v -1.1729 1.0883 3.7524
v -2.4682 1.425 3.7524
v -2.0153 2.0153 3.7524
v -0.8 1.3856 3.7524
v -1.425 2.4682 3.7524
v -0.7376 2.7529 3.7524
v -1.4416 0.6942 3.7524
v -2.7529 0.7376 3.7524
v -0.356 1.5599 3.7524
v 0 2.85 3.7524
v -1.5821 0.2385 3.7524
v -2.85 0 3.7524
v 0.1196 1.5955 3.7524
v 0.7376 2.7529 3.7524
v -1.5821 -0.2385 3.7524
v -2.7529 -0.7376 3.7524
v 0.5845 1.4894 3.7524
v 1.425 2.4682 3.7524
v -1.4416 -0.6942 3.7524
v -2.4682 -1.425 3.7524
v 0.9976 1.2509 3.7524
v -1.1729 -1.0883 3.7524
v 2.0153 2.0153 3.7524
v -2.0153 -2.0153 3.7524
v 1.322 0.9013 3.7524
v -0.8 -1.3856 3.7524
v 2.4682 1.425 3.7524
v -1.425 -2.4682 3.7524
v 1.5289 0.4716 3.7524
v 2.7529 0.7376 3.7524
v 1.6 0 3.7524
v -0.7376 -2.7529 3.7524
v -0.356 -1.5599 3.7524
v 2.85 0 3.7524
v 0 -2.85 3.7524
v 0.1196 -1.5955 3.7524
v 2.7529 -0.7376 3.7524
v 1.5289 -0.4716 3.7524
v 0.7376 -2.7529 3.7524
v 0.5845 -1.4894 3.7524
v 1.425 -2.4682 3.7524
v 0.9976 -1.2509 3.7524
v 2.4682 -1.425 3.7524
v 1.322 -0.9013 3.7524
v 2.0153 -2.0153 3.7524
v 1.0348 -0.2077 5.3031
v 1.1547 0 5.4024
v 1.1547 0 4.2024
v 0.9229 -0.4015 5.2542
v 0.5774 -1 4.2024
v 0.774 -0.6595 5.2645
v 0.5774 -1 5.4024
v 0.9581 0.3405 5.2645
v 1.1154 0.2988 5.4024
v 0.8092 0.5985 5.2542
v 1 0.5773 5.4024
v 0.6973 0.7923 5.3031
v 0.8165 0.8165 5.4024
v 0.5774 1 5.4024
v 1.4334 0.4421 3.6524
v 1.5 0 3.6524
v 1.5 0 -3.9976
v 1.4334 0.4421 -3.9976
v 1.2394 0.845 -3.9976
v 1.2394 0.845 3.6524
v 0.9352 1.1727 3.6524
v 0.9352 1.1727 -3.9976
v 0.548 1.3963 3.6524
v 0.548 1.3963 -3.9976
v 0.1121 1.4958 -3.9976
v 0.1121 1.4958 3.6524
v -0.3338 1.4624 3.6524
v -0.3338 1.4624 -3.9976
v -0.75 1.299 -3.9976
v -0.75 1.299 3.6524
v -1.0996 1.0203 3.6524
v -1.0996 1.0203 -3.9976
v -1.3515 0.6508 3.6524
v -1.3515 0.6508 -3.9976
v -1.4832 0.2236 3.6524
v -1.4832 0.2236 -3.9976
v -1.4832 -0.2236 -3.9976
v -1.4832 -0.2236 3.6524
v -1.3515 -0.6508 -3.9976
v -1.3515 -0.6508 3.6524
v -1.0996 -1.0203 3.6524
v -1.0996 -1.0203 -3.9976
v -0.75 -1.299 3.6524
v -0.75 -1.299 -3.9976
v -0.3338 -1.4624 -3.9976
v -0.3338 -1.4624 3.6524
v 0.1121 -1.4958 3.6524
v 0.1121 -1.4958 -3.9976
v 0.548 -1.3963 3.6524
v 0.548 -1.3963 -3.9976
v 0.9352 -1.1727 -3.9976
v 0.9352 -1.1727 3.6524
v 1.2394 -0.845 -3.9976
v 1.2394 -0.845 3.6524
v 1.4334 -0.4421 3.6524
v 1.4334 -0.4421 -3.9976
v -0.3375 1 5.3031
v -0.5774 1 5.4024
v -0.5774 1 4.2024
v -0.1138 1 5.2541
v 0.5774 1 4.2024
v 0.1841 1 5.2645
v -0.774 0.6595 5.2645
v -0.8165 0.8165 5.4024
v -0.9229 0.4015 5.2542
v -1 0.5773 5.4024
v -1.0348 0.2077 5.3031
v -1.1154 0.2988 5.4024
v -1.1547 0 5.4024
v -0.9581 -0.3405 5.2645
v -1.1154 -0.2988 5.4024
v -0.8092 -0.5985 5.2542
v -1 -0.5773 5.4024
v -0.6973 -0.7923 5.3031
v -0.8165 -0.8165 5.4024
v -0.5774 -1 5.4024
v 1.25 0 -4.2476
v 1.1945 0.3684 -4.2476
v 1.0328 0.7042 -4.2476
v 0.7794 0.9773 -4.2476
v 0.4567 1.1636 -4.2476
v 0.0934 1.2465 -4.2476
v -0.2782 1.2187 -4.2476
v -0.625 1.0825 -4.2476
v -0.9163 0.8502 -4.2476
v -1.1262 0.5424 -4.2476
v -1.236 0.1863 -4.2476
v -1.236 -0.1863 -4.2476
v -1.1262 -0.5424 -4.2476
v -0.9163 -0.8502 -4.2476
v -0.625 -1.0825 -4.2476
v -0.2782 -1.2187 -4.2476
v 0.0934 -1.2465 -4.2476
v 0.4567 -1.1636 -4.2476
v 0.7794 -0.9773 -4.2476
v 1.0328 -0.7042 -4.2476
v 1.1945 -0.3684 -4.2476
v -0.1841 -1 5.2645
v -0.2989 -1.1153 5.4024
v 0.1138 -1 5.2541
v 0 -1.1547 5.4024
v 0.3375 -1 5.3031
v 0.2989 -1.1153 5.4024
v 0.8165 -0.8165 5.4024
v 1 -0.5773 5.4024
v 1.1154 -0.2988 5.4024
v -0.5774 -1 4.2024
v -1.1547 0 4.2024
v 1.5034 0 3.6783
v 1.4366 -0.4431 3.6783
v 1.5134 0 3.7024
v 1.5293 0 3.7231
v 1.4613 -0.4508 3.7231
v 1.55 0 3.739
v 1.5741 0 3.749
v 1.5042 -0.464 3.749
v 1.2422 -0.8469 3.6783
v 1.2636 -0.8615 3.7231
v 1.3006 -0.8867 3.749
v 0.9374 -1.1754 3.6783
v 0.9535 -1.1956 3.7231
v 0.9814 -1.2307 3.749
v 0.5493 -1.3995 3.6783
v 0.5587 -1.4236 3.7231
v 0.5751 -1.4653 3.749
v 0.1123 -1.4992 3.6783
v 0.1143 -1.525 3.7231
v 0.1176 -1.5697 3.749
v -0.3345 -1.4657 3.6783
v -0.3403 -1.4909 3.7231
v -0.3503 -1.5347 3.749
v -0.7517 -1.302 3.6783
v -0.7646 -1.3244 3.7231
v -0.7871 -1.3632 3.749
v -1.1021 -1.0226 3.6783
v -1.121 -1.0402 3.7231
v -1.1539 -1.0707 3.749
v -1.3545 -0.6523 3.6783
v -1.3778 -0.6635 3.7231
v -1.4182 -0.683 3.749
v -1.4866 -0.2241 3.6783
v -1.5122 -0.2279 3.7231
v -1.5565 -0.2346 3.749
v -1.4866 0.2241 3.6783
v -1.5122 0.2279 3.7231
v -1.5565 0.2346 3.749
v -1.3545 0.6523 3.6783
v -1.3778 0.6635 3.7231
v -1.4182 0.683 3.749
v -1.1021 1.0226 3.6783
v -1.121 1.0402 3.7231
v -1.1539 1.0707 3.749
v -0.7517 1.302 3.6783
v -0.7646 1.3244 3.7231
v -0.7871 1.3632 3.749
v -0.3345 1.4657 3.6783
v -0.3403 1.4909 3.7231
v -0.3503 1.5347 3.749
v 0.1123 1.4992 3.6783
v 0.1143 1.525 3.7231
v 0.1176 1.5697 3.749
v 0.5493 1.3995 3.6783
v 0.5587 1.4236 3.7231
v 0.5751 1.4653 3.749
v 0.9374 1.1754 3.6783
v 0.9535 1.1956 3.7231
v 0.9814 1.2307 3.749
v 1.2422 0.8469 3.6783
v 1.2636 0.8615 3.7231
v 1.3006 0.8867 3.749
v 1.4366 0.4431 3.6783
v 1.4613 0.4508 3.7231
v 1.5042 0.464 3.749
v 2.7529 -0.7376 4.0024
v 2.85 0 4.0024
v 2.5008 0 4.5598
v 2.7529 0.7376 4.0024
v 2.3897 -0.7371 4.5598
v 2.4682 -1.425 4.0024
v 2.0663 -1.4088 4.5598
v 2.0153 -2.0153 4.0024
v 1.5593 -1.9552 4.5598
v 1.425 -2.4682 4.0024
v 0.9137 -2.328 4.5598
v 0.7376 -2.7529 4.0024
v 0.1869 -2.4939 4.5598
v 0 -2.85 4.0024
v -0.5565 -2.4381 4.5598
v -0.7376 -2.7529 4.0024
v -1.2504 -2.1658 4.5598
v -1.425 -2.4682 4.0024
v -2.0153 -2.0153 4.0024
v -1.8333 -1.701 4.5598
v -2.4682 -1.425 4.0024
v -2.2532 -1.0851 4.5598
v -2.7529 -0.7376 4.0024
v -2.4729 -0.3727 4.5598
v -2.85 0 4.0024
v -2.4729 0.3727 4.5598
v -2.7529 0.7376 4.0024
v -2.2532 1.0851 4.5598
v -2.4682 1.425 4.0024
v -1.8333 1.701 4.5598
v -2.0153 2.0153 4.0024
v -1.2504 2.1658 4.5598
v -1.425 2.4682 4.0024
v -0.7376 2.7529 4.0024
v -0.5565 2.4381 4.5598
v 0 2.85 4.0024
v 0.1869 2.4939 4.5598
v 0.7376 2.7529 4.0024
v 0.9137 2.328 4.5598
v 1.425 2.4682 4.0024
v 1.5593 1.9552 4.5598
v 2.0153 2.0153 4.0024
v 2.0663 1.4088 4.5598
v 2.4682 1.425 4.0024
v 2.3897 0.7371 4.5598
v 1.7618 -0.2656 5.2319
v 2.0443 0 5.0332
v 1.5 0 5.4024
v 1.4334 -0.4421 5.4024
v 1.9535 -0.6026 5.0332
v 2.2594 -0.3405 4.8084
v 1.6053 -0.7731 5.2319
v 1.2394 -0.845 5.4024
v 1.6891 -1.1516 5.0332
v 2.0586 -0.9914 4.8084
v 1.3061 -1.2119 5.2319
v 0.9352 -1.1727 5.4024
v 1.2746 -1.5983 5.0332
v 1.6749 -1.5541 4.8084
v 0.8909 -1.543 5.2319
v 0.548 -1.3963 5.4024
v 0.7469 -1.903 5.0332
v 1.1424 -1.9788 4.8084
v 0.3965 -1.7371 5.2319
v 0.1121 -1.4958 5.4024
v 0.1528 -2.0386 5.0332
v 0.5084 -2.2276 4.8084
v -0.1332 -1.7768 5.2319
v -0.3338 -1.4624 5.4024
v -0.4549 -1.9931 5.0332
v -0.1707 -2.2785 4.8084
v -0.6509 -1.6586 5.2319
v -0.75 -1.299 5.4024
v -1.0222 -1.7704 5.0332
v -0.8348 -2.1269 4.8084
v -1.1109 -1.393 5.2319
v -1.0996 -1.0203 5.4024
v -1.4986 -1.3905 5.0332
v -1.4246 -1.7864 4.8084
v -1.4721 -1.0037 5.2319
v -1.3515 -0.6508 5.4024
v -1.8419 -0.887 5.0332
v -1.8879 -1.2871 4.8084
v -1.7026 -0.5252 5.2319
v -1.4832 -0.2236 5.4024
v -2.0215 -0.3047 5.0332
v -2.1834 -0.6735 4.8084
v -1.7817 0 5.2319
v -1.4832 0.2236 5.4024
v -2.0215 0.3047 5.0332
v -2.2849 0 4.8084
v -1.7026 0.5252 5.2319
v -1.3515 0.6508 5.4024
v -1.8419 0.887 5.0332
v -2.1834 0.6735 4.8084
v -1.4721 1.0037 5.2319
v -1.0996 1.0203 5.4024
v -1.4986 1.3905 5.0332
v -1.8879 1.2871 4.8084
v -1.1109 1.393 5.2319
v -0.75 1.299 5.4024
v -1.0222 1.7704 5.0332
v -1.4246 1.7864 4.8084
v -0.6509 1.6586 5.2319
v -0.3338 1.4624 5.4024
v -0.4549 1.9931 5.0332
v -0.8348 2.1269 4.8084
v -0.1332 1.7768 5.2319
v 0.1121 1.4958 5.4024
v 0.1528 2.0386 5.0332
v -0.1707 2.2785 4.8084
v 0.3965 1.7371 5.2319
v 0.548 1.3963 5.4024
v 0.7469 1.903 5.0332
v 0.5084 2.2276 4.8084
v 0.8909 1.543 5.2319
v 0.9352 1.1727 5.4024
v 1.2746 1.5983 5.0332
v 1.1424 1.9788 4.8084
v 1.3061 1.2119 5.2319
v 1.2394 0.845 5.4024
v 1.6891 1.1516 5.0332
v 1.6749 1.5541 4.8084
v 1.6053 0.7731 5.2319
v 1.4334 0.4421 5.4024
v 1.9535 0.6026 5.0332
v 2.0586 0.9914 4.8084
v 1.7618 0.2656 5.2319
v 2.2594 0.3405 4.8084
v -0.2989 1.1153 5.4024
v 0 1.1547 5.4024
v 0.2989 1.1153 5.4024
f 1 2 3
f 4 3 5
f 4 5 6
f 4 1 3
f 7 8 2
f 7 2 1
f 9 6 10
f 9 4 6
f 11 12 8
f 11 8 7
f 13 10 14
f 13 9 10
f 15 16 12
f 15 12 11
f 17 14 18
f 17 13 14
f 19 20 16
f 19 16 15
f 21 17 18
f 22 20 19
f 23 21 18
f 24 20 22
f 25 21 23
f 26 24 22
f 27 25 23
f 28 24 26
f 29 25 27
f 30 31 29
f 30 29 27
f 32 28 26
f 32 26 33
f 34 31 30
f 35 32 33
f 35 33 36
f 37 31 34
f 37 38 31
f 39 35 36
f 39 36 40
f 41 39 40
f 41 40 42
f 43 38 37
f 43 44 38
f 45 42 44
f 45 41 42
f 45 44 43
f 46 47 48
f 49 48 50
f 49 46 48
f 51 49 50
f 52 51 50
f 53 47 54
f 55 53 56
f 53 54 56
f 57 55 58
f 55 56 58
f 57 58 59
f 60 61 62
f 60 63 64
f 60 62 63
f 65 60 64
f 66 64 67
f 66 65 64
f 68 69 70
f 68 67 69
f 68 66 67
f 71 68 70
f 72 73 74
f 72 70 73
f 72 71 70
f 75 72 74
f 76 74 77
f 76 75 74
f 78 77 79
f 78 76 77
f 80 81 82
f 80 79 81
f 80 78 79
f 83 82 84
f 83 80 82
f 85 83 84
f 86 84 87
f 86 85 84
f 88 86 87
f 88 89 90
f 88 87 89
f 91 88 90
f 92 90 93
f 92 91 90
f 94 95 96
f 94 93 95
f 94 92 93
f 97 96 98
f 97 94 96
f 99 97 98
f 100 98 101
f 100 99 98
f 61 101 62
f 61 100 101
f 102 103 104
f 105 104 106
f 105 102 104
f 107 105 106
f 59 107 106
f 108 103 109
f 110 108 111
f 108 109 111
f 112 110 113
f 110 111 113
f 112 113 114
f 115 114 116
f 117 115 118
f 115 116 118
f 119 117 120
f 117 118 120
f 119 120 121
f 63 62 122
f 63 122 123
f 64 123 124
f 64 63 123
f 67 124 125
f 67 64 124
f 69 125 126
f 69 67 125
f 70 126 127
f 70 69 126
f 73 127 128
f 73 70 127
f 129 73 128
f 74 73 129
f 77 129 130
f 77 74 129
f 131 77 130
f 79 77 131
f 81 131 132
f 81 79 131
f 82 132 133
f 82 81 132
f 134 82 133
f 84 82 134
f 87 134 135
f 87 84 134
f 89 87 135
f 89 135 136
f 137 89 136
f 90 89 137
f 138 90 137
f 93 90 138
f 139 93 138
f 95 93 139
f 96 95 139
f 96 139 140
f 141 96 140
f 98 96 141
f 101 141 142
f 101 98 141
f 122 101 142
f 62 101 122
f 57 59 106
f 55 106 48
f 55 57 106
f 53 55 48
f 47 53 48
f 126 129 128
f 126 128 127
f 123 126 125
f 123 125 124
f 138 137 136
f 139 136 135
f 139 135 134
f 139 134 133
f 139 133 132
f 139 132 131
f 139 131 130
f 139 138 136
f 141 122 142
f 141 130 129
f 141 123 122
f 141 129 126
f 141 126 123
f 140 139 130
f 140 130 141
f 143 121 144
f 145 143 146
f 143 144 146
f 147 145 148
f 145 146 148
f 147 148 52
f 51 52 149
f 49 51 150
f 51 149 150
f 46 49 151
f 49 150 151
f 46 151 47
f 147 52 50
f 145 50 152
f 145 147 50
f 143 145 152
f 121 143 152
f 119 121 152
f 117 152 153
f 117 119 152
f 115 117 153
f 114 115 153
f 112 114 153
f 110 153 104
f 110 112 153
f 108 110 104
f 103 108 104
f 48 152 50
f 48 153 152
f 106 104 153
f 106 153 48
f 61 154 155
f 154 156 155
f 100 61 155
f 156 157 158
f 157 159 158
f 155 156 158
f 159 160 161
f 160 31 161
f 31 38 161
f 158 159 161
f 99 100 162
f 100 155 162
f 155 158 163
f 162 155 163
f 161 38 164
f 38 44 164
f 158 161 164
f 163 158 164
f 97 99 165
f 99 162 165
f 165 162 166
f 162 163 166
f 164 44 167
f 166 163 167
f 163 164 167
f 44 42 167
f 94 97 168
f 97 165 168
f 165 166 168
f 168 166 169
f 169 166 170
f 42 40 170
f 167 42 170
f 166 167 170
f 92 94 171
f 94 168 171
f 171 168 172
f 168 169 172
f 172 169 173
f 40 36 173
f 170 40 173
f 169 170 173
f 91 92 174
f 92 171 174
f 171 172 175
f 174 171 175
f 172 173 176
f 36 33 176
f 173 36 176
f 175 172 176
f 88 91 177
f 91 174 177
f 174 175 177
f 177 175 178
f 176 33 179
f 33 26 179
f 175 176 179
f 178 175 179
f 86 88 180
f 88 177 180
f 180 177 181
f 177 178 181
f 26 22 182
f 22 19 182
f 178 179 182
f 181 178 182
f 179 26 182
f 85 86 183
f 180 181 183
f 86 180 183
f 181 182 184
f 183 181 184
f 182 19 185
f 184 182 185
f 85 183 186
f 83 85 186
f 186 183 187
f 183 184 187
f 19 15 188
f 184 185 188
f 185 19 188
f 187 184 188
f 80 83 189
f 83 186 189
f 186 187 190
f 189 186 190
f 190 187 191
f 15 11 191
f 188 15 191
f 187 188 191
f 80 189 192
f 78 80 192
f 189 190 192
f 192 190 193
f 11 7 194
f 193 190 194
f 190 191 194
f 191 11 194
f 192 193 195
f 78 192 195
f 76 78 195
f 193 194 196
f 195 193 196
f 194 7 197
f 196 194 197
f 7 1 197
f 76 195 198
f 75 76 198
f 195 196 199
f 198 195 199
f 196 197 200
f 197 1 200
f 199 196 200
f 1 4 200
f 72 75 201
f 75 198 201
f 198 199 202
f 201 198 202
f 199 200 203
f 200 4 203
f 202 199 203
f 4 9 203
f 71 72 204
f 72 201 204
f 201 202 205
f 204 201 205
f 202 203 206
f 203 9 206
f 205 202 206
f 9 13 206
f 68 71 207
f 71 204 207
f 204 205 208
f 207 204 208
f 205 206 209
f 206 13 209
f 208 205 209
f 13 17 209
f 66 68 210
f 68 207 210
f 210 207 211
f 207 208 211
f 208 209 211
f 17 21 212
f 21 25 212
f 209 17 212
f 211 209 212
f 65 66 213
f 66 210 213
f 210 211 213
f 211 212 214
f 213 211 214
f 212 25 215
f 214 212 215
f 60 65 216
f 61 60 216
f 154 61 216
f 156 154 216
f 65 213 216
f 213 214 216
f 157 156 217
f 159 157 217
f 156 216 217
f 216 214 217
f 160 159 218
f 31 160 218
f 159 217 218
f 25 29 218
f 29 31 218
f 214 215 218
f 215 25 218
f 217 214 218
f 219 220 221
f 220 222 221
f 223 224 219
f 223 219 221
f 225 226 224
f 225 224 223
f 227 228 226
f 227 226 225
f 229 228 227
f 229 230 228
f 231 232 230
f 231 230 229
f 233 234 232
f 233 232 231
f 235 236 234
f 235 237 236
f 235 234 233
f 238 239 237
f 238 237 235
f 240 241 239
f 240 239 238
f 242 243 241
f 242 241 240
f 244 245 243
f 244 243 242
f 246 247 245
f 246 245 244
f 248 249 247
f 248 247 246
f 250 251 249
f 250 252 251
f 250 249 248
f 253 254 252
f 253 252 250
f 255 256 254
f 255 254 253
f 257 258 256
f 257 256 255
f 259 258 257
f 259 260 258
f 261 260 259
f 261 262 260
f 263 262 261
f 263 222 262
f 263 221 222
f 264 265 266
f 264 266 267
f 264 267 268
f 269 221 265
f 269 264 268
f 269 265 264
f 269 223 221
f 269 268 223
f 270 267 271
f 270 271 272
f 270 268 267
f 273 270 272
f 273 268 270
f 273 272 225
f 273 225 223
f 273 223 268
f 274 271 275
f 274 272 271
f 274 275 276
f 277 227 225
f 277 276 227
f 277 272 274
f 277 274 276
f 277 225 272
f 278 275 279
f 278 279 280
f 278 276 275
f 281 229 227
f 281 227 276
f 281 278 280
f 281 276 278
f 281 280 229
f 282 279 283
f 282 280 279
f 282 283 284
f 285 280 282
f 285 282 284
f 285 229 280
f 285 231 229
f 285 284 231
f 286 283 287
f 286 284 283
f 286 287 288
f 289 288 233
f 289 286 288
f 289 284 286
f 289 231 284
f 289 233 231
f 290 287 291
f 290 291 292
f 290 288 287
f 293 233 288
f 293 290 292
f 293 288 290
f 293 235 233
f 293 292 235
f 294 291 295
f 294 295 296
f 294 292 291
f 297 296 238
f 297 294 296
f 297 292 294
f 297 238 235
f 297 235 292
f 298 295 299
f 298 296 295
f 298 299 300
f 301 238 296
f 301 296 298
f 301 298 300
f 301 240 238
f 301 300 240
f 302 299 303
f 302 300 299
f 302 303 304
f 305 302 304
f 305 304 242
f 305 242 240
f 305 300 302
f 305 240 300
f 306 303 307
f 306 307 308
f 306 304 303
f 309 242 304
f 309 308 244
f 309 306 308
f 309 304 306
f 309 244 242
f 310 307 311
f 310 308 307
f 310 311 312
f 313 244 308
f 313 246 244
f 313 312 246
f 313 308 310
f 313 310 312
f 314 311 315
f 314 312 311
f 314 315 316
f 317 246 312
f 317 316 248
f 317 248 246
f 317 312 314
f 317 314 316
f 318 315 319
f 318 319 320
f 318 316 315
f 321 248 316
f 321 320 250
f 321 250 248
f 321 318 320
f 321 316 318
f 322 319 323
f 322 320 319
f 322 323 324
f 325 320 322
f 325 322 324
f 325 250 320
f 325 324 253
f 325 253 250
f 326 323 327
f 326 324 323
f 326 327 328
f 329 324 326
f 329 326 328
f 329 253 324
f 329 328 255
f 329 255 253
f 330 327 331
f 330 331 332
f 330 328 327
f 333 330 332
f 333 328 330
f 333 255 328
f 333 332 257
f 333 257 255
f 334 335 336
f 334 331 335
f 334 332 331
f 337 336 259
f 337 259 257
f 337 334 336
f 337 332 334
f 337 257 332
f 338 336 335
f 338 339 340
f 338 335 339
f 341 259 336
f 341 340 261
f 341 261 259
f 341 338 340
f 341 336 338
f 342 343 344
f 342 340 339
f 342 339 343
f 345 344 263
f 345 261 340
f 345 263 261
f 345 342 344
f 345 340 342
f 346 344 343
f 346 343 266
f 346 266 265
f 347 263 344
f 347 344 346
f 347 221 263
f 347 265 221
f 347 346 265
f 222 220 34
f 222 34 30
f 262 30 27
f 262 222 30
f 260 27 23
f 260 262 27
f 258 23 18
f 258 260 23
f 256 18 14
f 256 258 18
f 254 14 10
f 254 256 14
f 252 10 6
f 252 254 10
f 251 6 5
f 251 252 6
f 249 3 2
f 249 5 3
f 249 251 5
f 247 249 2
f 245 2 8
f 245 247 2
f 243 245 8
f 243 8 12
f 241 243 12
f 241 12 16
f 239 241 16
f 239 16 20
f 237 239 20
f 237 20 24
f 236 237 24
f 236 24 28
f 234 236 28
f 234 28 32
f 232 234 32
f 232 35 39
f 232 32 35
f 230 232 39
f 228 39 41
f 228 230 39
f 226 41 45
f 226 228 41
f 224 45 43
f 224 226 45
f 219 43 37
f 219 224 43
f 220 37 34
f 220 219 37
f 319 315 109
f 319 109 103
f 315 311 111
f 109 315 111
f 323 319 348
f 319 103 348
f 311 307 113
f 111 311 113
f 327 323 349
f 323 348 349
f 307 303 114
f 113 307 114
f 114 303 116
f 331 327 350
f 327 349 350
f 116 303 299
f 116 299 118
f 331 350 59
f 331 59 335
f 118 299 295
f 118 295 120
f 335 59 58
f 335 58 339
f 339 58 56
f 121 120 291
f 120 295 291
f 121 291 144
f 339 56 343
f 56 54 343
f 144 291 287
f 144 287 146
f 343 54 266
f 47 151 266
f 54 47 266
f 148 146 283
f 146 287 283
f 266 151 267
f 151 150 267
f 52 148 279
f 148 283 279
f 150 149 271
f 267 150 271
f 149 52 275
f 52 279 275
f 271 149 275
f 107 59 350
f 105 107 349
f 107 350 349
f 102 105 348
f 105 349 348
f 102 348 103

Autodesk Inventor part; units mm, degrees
ref_plane "YZ Plane" through (0, 0, 0) normal (1, 0, 0) x (0, 1, 0)
ref_plane "XZ Plane" through (0, 0, 0) normal (0, 1, 0) x (-1, 0, 0)
ref_plane "XY Plane" through (0, 0, 0) normal (0, 0, 1) x (1, 0, 0)
sketch "Sketch1" plane through (0, 0, 0) normal (0, 1, 0) x (-1, 0, 0)
  line L0 (0, 4.2476) -> (0, -4.2476)
  line L1 (0, -4.2476) -> (-1.25, -4.2476)
  line L2 (-1.25, -4.2476) -> (-1.5, -3.9976)
  line L3 (-1.5, -3.9976) -> (-1.5, 3.6524)
  line L4 (-1.6, 3.7524) -> (-2.85, 3.7524)
  line L5 (-2.85, 3.7524) -> (-2.85, 4.0024)
  line L6 (0, 4.2476) -> (-1.1547, 5.4024)
  line L7 (-1.1547, 5.4024) -> (-1.5, 5.4024)
  arc A0 (-1.5, 5.4024) -> (-2.85, 4.0024) centre (0, 2.605) ccw
  line L8 (-1.1547, 5.4024) -> (-0.5774, 6.4024) construction
  line L9 (-0.5774, 6.4024) -> (0.5774, 6.4024) construction
  line L10 (0.5774, 6.4024) -> (1.1547, 5.4024) construction
  line L11 (1.1547, 5.4024) -> (0.5774, 4.4024) construction
  line L12 (0.5774, 4.4024) -> (-0.5774, 4.4024) construction
  line L13 (-0.5774, 4.4024) -> (-1.1547, 5.4024) construction
  arc A1 (-1.5, 3.6524) -> (-1.6, 3.7524) centre (-1.6, 3.6524) ccw
  point P0 (0, 0)
  point P1 (-1.5, 3.7524)
  point P2 (0, 0)
  point P3 (0, 5.4024)
  dimension "d0" = 3
  dimension "d1" = 8
  dimension "d2" = 0.25
  dimension "d3" = 135
  dimension "d4" = 5.7
  dimension "d5" = 3
  dimension "d6" = 1.65
  dimension "d7" = 2
  dimension "d8" = 0.25
  dimension "d15" = 3.2
revolve "Revolution1" add sketch "Sketch1" angle 360 about axis through (0, 0, 4.2476) along (0, 0, -1)
sketch "Sketch2" plane through (0, 0, 5.4024) normal (0, 0, 1) x (1, 0, 0)
  circle A0 centre (0, 0) radius 1.1547 projected
  circle A1 centre (0, 0) radius 1.5 projected
  line L0 (-1.1547, 0) -> (-0.5774, 1)
  line L1 (-0.5774, 1) -> (0.5774, 1)
  line L2 (0.5774, 1) -> (1.1547, 0)
  line L3 (1.1547, 0) -> (0.5774, -1)
  line L4 (0.5774, -1) -> (-0.5774, -1)
  line L5 (-0.5774, -1) -> (-1.1547, 0)
  point P0 (0, 0)
extrude "Extrusion1" cut sketch "Sketch2" against normal blind 1.2 contours L3 L4 L5 L0 L1 L2
thread "Thread1" size "M3x0.5" class "6g" standard "ANSI Metric M Profile" full length
properties part number "48-0380" material "Stainless Steel"
